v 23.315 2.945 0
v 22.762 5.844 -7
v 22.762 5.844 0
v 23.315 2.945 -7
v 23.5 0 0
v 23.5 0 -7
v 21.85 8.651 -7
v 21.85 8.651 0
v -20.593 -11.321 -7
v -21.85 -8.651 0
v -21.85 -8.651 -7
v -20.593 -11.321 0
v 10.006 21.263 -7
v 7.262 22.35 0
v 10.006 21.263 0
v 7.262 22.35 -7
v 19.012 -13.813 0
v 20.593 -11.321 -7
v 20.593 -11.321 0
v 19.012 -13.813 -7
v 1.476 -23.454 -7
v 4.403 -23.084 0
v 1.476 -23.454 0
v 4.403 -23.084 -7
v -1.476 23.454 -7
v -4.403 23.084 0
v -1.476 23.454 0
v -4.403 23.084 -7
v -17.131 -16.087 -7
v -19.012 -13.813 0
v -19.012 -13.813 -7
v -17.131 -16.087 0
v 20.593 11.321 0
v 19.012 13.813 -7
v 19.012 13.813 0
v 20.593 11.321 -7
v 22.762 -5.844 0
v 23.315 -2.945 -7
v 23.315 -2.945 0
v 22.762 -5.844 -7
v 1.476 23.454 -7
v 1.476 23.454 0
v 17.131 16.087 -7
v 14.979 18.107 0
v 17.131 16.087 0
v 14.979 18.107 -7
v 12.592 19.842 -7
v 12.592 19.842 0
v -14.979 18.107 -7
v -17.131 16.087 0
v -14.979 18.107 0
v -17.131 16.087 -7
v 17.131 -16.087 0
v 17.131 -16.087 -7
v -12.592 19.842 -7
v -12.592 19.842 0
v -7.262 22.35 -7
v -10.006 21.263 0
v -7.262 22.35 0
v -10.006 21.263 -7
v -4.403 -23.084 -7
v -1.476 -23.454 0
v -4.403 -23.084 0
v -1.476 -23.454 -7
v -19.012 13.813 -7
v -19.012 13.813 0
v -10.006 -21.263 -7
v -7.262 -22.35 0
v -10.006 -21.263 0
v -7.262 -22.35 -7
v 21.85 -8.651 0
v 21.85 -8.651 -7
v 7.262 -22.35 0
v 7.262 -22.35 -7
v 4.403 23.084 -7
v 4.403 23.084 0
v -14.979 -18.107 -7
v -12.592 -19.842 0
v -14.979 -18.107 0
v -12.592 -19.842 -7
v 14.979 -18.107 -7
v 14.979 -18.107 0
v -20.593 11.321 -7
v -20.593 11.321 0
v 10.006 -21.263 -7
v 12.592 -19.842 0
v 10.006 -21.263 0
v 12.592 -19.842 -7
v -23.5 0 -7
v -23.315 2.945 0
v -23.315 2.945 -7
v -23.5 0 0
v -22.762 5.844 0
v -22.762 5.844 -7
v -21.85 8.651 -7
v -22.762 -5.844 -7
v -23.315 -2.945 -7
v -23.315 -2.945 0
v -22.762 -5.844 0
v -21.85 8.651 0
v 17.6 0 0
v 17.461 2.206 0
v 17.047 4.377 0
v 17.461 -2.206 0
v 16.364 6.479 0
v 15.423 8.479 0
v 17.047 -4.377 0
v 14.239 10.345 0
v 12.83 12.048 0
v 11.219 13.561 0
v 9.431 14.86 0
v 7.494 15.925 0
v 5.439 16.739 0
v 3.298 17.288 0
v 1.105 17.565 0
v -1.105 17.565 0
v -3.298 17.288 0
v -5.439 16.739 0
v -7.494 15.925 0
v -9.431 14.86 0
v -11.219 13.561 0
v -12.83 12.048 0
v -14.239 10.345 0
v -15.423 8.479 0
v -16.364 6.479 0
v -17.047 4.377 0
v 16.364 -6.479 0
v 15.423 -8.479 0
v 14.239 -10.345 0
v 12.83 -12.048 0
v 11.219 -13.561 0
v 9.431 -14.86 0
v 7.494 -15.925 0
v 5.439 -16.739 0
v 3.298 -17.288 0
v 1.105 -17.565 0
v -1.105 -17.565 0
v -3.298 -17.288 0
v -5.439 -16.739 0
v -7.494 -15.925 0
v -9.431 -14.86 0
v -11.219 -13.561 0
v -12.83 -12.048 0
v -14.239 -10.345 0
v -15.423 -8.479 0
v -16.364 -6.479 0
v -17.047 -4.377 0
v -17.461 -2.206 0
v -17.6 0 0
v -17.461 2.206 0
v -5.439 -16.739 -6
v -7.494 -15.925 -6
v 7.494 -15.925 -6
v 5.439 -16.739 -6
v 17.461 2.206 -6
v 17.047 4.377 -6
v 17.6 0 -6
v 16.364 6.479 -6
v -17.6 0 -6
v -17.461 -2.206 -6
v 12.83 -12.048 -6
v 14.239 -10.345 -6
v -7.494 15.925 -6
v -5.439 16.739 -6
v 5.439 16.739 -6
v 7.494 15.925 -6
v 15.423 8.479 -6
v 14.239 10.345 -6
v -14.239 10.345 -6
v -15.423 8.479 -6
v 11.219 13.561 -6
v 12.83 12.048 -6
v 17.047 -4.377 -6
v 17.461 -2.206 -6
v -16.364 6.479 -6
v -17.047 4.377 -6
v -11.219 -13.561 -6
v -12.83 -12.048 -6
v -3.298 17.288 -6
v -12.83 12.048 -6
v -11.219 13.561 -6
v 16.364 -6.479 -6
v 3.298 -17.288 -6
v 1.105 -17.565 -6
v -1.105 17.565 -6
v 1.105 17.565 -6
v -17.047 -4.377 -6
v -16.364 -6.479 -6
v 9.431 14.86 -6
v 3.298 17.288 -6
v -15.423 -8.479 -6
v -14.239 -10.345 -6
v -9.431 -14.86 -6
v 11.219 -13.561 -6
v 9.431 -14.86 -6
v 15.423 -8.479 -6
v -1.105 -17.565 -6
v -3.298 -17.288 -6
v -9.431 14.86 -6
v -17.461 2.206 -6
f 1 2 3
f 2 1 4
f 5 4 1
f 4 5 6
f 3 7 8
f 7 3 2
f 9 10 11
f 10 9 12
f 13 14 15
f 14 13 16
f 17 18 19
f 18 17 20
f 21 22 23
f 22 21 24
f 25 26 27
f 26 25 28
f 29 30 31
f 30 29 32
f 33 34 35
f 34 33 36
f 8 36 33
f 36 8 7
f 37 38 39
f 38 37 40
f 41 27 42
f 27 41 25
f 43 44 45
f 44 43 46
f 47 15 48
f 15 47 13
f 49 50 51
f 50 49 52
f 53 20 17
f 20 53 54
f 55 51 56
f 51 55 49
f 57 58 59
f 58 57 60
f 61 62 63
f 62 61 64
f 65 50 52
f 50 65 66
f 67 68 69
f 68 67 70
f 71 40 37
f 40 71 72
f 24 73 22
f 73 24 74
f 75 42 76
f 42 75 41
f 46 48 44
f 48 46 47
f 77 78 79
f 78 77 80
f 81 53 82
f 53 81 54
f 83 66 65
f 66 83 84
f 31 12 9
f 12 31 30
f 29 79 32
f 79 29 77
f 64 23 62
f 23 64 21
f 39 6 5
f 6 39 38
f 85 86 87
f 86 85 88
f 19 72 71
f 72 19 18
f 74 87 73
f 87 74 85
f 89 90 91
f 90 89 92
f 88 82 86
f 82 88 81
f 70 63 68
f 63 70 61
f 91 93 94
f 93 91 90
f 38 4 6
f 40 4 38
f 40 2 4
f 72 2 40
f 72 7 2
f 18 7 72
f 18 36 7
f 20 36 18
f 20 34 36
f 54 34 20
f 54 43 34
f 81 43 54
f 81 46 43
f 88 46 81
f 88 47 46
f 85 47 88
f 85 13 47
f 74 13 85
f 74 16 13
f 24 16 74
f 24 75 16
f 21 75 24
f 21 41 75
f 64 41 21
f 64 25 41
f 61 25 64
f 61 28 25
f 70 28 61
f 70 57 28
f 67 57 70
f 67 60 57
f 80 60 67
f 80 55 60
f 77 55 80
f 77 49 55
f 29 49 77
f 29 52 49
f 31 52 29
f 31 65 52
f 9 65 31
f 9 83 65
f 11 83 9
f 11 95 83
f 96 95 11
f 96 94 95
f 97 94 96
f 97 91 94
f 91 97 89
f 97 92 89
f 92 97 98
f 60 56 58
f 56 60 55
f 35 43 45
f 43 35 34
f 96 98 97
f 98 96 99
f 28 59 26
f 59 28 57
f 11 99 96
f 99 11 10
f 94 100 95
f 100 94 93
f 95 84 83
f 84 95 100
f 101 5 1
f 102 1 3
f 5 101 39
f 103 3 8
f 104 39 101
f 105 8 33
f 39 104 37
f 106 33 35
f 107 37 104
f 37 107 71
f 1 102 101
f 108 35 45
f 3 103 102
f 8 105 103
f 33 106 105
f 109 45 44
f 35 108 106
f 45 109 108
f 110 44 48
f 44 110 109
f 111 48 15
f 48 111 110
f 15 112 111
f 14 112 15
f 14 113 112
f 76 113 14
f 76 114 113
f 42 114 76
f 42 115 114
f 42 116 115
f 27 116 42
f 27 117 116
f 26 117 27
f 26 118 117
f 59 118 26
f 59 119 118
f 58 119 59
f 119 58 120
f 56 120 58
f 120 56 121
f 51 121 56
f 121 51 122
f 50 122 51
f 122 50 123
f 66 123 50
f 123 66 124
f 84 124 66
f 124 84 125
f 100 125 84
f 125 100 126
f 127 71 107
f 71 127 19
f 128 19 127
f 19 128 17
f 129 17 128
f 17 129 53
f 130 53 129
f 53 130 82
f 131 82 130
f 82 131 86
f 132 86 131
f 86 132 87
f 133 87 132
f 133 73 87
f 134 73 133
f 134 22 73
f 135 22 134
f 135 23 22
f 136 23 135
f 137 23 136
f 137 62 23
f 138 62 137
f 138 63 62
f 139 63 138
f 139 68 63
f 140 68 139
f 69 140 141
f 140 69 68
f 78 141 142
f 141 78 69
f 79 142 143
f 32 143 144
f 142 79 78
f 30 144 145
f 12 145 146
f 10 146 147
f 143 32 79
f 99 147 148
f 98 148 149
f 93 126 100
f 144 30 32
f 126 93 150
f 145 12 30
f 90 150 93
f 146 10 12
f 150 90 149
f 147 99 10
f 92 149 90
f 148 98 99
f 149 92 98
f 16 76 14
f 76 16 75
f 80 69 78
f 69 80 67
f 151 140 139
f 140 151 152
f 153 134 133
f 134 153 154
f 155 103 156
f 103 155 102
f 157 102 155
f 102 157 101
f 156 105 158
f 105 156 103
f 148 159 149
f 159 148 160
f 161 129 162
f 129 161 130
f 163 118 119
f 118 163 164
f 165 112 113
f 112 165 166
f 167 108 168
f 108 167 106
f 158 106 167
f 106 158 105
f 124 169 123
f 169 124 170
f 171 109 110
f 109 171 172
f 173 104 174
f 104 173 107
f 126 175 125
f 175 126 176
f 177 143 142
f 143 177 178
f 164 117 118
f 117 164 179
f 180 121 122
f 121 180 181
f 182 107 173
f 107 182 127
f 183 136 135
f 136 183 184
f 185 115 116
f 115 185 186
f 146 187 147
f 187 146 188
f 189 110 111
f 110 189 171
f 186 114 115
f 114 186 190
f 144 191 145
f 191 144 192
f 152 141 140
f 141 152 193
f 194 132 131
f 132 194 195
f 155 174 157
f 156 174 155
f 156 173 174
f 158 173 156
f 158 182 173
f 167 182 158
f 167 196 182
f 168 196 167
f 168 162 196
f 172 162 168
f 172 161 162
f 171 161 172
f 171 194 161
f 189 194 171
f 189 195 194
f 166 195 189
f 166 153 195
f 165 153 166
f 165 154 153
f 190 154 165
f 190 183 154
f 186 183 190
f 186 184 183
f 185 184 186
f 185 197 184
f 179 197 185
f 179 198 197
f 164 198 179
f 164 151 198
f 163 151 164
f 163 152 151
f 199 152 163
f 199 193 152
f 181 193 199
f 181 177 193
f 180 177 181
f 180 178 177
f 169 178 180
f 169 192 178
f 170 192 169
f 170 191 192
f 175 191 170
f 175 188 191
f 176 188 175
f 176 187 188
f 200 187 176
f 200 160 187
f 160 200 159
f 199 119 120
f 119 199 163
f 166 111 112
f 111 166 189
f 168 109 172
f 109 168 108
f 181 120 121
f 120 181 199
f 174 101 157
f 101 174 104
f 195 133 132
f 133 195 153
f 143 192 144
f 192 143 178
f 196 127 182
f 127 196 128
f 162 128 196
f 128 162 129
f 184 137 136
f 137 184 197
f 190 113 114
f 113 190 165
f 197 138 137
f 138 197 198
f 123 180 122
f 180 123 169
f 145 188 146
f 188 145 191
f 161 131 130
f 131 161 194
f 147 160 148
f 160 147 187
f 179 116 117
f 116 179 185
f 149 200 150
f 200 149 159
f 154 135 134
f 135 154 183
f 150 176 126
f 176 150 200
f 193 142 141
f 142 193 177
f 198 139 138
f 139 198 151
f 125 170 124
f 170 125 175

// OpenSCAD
$fn = 50;


difference() {
	union() {
		translate(v = [0, 0, -7.0000000000]) {
			cylinder(h = 7, r = 23.5000000000);
		}
	}
	union() {
		#translate(v = [0, 0, -6.0000000000]) {
			cylinder(h = 6, r = 17.6000000000);
		}
	}
}
